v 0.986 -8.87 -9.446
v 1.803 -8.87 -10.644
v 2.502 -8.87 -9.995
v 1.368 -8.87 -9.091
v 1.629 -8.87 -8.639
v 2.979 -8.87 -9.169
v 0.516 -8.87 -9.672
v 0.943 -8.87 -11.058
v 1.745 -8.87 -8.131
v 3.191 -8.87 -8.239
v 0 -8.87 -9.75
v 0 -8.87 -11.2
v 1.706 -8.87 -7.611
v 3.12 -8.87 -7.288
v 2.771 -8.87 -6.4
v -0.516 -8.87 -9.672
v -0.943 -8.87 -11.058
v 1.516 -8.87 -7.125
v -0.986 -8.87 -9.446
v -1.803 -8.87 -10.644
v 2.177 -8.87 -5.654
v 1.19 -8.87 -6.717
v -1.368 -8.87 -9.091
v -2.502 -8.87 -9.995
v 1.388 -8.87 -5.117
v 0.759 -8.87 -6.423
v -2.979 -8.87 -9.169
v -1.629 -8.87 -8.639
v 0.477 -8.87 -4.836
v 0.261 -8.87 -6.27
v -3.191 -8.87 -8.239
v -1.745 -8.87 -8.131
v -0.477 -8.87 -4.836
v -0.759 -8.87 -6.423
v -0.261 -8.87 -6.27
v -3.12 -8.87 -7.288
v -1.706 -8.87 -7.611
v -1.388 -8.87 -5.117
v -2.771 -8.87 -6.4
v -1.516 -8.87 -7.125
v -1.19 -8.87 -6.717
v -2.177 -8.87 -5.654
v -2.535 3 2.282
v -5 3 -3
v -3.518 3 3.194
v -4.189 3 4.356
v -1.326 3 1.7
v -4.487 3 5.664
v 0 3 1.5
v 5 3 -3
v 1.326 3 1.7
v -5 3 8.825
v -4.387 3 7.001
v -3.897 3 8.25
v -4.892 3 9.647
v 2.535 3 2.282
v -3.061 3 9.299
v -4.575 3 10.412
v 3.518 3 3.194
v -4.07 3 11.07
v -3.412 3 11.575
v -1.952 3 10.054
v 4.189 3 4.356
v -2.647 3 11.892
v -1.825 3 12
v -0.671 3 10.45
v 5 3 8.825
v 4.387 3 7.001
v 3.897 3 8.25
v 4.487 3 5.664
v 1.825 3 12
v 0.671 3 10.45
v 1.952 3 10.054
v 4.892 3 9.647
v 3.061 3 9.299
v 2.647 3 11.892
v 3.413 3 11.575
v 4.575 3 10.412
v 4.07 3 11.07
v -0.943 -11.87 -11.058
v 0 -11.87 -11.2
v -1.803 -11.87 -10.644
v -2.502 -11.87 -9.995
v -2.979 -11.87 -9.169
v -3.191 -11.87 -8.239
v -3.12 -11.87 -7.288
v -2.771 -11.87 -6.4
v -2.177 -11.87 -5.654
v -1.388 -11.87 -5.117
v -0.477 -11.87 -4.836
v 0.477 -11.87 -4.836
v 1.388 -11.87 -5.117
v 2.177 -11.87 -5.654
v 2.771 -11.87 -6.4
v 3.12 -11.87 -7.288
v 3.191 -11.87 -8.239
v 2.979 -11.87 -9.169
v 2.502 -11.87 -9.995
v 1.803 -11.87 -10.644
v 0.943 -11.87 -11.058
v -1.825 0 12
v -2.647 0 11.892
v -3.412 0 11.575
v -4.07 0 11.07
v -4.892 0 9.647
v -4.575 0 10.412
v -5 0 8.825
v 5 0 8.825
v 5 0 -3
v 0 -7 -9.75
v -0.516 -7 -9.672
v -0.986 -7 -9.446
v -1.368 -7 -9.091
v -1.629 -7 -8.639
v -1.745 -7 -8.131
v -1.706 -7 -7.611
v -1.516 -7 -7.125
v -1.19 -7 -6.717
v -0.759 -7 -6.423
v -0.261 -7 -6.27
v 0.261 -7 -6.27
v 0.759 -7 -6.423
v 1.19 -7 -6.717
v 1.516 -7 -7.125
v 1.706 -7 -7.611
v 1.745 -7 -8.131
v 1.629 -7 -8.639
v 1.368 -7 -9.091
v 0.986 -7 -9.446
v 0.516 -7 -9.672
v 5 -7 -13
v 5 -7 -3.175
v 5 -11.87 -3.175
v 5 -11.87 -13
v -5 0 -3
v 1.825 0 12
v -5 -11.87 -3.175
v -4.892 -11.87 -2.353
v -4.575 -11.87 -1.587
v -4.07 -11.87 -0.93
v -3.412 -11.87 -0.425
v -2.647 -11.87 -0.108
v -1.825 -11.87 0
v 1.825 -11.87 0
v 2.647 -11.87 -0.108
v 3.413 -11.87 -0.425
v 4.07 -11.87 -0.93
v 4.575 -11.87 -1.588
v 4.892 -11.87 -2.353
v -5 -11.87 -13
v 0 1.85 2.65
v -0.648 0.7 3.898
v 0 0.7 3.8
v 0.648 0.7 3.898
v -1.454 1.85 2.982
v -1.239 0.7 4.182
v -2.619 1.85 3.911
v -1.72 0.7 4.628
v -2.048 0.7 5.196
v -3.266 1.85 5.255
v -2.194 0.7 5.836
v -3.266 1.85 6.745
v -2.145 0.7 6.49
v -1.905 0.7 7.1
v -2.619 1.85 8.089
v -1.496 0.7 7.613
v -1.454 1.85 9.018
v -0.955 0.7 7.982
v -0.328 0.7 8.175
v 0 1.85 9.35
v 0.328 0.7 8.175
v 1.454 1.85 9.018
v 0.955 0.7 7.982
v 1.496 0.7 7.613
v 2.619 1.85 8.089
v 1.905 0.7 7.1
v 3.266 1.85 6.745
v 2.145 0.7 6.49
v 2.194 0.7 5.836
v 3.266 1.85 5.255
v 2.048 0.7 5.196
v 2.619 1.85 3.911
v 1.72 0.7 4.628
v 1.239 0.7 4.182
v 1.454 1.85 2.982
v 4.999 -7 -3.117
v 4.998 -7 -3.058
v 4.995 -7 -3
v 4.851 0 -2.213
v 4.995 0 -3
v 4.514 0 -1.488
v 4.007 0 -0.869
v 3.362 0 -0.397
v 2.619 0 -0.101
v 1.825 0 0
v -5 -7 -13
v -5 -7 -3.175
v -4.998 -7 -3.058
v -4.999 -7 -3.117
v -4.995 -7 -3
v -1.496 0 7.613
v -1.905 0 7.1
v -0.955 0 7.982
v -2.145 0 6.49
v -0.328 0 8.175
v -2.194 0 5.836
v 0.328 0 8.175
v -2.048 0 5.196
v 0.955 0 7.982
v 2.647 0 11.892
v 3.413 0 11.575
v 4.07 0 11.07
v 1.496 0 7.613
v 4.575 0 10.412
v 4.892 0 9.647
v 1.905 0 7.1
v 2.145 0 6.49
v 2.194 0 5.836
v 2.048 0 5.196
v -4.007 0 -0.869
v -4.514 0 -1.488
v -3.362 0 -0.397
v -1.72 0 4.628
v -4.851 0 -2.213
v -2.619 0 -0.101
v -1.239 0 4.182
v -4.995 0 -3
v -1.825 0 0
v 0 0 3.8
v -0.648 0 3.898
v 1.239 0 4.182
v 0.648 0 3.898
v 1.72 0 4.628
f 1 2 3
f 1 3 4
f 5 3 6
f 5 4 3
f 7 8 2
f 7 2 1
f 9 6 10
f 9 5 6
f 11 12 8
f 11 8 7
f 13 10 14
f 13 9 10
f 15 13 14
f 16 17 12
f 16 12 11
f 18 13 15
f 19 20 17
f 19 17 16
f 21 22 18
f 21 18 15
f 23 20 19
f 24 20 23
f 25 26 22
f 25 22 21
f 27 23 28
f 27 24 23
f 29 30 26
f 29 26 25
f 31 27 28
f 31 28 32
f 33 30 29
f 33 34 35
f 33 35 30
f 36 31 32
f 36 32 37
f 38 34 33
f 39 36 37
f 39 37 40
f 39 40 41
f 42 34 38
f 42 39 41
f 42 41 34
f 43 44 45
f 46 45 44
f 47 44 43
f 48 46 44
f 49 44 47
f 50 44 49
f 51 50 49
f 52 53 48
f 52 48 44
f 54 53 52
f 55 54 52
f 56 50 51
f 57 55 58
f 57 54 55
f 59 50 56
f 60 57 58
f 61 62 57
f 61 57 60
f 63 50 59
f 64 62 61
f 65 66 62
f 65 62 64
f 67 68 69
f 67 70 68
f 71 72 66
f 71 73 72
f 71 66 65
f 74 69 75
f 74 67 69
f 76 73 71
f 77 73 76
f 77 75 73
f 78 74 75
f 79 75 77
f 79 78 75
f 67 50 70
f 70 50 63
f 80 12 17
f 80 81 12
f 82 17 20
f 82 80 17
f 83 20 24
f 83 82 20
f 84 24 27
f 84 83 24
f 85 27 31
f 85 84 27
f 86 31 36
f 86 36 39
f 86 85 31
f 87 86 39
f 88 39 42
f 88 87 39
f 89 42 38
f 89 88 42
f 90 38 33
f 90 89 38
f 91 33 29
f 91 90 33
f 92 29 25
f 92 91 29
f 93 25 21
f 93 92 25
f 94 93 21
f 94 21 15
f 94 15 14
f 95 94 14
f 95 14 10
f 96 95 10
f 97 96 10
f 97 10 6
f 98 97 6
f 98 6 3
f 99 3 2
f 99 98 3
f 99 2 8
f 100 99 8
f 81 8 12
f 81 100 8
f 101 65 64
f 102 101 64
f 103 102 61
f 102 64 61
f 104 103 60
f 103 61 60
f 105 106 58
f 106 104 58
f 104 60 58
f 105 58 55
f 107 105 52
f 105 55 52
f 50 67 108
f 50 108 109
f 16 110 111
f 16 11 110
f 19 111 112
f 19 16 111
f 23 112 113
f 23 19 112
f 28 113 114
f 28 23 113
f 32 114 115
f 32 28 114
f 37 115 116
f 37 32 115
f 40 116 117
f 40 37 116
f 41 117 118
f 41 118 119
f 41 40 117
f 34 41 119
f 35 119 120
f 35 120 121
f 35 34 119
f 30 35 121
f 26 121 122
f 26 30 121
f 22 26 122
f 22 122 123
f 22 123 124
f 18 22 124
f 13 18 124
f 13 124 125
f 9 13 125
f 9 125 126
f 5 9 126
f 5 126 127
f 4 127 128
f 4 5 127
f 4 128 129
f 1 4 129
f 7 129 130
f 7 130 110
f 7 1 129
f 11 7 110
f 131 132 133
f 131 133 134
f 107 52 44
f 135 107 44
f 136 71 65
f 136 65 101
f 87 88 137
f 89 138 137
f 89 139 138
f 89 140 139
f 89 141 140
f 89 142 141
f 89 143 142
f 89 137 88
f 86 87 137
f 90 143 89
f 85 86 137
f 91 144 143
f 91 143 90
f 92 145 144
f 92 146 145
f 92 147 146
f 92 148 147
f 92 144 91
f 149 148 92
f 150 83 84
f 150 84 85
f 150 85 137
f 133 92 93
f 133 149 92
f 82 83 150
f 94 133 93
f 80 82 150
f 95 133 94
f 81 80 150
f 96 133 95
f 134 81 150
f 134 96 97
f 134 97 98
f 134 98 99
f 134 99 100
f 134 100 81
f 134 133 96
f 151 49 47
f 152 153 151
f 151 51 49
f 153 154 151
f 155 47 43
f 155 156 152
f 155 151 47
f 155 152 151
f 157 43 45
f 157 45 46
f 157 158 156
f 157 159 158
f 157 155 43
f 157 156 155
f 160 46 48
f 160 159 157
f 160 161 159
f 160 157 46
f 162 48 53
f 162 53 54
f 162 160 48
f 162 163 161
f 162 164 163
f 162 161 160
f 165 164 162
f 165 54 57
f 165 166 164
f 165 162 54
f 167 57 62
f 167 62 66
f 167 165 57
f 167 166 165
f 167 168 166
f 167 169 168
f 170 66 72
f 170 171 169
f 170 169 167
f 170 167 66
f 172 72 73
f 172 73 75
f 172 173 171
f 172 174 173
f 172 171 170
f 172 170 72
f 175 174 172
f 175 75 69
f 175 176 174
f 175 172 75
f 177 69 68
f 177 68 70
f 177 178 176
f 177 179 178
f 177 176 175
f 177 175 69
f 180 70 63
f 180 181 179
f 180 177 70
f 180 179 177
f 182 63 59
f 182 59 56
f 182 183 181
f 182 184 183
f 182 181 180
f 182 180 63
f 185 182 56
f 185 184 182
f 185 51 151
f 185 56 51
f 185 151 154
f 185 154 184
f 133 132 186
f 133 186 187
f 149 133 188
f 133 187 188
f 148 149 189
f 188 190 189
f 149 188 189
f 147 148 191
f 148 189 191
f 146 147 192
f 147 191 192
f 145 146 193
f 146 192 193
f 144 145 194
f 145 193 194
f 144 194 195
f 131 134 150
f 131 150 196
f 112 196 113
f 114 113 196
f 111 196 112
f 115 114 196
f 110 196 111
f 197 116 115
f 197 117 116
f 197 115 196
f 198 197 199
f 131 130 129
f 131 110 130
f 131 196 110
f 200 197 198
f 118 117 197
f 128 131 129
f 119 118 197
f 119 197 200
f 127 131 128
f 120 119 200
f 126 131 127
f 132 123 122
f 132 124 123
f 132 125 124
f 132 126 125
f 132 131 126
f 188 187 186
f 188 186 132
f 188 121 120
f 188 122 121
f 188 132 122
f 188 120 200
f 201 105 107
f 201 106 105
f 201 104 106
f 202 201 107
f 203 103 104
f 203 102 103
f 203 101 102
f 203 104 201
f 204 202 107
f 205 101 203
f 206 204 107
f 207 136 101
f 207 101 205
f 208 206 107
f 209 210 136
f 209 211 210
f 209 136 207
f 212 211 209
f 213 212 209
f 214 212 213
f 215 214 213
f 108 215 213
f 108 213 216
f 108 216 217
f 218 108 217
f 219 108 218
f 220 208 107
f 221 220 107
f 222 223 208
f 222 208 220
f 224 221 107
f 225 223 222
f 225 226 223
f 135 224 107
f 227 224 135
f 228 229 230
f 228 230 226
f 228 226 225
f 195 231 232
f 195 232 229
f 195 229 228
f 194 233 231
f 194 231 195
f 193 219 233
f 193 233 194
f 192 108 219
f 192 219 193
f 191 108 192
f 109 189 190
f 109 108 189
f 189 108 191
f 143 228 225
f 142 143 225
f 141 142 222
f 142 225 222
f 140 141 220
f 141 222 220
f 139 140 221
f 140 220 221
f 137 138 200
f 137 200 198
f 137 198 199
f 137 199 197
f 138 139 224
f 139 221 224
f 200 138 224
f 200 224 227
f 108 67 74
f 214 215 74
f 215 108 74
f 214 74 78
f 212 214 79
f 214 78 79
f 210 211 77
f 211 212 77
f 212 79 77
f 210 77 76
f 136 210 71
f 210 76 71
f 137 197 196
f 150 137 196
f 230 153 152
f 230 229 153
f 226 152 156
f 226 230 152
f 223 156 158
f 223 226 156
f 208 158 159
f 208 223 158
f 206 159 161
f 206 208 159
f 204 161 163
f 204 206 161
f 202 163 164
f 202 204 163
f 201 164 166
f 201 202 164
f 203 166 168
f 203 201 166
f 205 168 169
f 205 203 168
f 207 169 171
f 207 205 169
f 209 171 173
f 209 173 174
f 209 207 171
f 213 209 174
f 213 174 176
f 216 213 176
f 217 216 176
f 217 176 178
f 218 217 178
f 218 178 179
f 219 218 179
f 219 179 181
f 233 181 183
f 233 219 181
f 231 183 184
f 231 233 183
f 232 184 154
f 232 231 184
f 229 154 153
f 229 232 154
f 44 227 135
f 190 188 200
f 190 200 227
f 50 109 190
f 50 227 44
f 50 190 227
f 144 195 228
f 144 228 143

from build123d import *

# Parameters (mm, degrees)
BOSS_EXTRUDE1_DEPTH = 5
FILLET2_R           = 3.175


with BuildPart() as part:
    # Sketch1 → Boss-Extrude1 (new, symmetric)
    with BuildSketch(Plane(origin=(0, 0, 0), x_dir=(0, 0, -1), z_dir=(1, 0, 0))):
        Polygon((-12, 0), (0, 0), (0, -11.87), (13, -11.87), (13, -7), (3, -7), (3, 3), (-12, 3), align=None)
    extrude(amount=BOSS_EXTRUDE1_DEPTH, both=True)

    # Sketch4 → Cut-Revolve1 (revolve, cut)
    with BuildSketch(Plane(origin=(0, 0, 0), x_dir=(0, 0, -1), z_dir=(1, 0, 0)), mode=Mode.PRIVATE) as cut_revolve1_sk:
        Polygon((-6, 3), (-10.5, 3), (-8.2, 0.7), (-8.2, 0), (-6, 0), align=None)
    revolve(cut_revolve1_sk.sketch.rotate(Axis((0, 0, 6), (0, 1, 0)), 180), axis=Axis((0, 0, 6), (0, 1, 0)), mode=Mode.SUBTRACT)

    # Sketch5 → Cut-Revolve2 (revolve, cut)
    with BuildSketch(Plane(origin=(0, 0, 0), x_dir=(0, 0, -1), z_dir=(1, 0, 0))):
        Polygon((8, -11.87), (8, -7), (9.75, -7), (9.75, -8.87), (11.2, -8.87), (11.2, -11.87), align=None)
    revolve(axis=Axis((0, -11.87, -8), (0, 1, 0)), mode=Mode.SUBTRACT)

    # Fillet2
    # the kernel refuses this fillet: 3.175 mm, written as the material it takes off along each edge
    with BuildSketch(Plane(origin=(-5, 0, 0), x_dir=(0, 0, -1), z_dir=(0, -1, 0)), Plane(origin=(5, 0, 0), x_dir=(-1, 0, 0), z_dir=(0, -1, 0))) as fillet2_piece_1:
        with BuildLine():
            CenterArc((FILLET2_R, FILLET2_R), FILLET2_R, 180, 90)
            Line((0, FILLET2_R), (0, 0))
            Line((0, 0), (FILLET2_R, 0))
        make_face()
    extrude(amount=19.8075, mode=Mode.SUBTRACT)
    with BuildSketch(Plane(origin=(-5, 10.9375, 12), x_dir=(0, 0, -1), z_dir=(0, -1, 0)), Plane(origin=(5, 10.9375, 12), x_dir=(-1, 0, 0), z_dir=(0, -1, 0))) as fillet2_piece_2:
        with BuildLine():
            CenterArc((FILLET2_R, FILLET2_R), FILLET2_R, 180, 90)
            Line((0, FILLET2_R), (0, 0))
            Line((0, 0), (FILLET2_R, 0))
        make_face()
    extrude(amount=18.875, mode=Mode.SUBTRACT)


solid = part.part
